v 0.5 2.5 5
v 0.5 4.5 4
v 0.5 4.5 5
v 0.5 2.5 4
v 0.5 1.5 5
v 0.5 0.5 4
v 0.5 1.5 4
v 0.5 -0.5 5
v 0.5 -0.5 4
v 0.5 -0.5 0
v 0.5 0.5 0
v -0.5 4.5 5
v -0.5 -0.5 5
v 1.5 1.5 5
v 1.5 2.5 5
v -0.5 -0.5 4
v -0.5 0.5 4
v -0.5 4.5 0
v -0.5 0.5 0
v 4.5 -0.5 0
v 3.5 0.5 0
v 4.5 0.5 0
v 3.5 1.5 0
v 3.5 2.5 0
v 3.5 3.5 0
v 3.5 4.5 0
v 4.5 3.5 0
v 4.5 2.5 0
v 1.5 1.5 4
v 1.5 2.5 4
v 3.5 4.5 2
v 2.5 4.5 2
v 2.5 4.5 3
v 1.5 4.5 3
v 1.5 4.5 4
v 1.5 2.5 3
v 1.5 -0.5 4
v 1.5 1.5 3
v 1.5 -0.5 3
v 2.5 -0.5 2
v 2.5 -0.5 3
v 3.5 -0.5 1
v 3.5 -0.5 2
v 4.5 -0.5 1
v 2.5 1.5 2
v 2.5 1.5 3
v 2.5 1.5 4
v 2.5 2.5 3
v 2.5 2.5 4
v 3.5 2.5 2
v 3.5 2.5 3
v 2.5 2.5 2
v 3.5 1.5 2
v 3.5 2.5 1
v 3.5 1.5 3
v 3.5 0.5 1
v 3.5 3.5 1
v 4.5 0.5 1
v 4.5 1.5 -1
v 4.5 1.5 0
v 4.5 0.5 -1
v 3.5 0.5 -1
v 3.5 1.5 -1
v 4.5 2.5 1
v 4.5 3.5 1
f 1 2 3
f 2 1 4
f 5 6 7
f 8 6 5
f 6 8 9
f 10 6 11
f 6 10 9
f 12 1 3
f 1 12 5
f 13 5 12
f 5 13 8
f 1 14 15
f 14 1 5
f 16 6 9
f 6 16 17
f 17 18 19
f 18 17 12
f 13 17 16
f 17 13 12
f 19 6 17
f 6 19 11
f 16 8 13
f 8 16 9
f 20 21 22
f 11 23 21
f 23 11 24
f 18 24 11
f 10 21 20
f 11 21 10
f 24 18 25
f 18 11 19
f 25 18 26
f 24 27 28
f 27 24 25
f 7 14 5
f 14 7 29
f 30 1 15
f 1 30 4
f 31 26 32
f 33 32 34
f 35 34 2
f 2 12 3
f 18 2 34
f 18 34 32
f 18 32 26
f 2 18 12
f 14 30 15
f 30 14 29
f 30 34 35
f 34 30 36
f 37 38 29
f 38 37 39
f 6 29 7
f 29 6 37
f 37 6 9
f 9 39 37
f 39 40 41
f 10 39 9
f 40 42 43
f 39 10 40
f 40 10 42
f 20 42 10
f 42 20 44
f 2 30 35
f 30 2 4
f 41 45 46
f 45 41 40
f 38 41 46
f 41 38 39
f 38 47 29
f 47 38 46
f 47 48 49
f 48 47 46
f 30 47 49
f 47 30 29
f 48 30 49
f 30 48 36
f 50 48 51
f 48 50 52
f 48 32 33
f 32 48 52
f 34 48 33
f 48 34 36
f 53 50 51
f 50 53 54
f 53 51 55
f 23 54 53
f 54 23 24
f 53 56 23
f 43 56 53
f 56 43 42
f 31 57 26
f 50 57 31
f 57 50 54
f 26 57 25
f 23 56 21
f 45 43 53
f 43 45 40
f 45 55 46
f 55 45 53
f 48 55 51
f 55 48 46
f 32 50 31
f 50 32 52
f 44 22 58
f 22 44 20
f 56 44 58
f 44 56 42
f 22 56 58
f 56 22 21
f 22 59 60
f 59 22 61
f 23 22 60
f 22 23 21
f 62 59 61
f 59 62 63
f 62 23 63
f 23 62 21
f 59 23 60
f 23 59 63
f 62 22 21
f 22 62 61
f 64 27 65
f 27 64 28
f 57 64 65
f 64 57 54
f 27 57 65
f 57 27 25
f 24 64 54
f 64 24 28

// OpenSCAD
union() {
    translate([0, 0, 4.5]) color([1, 0, 0]) cube([1, 1, 1], center=true);
    translate([0, 1, 2.5]) cube([1, 1, 5], center=true);
    translate([0, 2, 2.5]) cube([1, 1, 5], center=true);
    translate([0, 3, 2.5]) cube([1, 1, 5], center=true);
    translate([0, 4, 2.5]) cube([1, 1, 5], center=true);
    translate([1, 0, 2.0]) cube([1, 1, 4], center=true);
    translate([1, 1, 2.0]) cube([1, 1, 4], center=true);
    translate([1, 2, 2.5]) cube([1, 1, 5], center=true);
    translate([1, 3, 2.0]) cube([1, 1, 4], center=true);
    translate([1, 4, 2.0]) cube([1, 1, 4], center=true);
    translate([2, 0, 1.5]) cube([1, 1, 3], center=true);
    translate([2, 1, 1.5]) cube([1, 1, 3], center=true);
    translate([2, 2, 2.0]) cube([1, 1, 4], center=true);
    translate([2, 3, 1.5]) cube([1, 1, 3], center=true);
    translate([2, 4, 1.5]) cube([1, 1, 3], center=true);
    translate([3, 0, 1.0]) cube([1, 1, 2], center=true);
    translate([3, 1, 1.0]) cube([1, 1, 2], center=true);
    translate([3, 2, 1.5]) cube([1, 1, 3], center=true);
    translate([3, 3, 1.0]) cube([1, 1, 2], center=true);
    translate([3, 4, 1.0]) cube([1, 1, 2], center=true);
    translate([4, 0, 0.5]) cube([1, 1, 1], center=true);
    translate([4, 1, -0.5]) color([0, 0, 1]) cube([1, 1, 1], center=true);
    translate([4, 3, 0.5]) cube([1, 1, 1], center=true);
}
